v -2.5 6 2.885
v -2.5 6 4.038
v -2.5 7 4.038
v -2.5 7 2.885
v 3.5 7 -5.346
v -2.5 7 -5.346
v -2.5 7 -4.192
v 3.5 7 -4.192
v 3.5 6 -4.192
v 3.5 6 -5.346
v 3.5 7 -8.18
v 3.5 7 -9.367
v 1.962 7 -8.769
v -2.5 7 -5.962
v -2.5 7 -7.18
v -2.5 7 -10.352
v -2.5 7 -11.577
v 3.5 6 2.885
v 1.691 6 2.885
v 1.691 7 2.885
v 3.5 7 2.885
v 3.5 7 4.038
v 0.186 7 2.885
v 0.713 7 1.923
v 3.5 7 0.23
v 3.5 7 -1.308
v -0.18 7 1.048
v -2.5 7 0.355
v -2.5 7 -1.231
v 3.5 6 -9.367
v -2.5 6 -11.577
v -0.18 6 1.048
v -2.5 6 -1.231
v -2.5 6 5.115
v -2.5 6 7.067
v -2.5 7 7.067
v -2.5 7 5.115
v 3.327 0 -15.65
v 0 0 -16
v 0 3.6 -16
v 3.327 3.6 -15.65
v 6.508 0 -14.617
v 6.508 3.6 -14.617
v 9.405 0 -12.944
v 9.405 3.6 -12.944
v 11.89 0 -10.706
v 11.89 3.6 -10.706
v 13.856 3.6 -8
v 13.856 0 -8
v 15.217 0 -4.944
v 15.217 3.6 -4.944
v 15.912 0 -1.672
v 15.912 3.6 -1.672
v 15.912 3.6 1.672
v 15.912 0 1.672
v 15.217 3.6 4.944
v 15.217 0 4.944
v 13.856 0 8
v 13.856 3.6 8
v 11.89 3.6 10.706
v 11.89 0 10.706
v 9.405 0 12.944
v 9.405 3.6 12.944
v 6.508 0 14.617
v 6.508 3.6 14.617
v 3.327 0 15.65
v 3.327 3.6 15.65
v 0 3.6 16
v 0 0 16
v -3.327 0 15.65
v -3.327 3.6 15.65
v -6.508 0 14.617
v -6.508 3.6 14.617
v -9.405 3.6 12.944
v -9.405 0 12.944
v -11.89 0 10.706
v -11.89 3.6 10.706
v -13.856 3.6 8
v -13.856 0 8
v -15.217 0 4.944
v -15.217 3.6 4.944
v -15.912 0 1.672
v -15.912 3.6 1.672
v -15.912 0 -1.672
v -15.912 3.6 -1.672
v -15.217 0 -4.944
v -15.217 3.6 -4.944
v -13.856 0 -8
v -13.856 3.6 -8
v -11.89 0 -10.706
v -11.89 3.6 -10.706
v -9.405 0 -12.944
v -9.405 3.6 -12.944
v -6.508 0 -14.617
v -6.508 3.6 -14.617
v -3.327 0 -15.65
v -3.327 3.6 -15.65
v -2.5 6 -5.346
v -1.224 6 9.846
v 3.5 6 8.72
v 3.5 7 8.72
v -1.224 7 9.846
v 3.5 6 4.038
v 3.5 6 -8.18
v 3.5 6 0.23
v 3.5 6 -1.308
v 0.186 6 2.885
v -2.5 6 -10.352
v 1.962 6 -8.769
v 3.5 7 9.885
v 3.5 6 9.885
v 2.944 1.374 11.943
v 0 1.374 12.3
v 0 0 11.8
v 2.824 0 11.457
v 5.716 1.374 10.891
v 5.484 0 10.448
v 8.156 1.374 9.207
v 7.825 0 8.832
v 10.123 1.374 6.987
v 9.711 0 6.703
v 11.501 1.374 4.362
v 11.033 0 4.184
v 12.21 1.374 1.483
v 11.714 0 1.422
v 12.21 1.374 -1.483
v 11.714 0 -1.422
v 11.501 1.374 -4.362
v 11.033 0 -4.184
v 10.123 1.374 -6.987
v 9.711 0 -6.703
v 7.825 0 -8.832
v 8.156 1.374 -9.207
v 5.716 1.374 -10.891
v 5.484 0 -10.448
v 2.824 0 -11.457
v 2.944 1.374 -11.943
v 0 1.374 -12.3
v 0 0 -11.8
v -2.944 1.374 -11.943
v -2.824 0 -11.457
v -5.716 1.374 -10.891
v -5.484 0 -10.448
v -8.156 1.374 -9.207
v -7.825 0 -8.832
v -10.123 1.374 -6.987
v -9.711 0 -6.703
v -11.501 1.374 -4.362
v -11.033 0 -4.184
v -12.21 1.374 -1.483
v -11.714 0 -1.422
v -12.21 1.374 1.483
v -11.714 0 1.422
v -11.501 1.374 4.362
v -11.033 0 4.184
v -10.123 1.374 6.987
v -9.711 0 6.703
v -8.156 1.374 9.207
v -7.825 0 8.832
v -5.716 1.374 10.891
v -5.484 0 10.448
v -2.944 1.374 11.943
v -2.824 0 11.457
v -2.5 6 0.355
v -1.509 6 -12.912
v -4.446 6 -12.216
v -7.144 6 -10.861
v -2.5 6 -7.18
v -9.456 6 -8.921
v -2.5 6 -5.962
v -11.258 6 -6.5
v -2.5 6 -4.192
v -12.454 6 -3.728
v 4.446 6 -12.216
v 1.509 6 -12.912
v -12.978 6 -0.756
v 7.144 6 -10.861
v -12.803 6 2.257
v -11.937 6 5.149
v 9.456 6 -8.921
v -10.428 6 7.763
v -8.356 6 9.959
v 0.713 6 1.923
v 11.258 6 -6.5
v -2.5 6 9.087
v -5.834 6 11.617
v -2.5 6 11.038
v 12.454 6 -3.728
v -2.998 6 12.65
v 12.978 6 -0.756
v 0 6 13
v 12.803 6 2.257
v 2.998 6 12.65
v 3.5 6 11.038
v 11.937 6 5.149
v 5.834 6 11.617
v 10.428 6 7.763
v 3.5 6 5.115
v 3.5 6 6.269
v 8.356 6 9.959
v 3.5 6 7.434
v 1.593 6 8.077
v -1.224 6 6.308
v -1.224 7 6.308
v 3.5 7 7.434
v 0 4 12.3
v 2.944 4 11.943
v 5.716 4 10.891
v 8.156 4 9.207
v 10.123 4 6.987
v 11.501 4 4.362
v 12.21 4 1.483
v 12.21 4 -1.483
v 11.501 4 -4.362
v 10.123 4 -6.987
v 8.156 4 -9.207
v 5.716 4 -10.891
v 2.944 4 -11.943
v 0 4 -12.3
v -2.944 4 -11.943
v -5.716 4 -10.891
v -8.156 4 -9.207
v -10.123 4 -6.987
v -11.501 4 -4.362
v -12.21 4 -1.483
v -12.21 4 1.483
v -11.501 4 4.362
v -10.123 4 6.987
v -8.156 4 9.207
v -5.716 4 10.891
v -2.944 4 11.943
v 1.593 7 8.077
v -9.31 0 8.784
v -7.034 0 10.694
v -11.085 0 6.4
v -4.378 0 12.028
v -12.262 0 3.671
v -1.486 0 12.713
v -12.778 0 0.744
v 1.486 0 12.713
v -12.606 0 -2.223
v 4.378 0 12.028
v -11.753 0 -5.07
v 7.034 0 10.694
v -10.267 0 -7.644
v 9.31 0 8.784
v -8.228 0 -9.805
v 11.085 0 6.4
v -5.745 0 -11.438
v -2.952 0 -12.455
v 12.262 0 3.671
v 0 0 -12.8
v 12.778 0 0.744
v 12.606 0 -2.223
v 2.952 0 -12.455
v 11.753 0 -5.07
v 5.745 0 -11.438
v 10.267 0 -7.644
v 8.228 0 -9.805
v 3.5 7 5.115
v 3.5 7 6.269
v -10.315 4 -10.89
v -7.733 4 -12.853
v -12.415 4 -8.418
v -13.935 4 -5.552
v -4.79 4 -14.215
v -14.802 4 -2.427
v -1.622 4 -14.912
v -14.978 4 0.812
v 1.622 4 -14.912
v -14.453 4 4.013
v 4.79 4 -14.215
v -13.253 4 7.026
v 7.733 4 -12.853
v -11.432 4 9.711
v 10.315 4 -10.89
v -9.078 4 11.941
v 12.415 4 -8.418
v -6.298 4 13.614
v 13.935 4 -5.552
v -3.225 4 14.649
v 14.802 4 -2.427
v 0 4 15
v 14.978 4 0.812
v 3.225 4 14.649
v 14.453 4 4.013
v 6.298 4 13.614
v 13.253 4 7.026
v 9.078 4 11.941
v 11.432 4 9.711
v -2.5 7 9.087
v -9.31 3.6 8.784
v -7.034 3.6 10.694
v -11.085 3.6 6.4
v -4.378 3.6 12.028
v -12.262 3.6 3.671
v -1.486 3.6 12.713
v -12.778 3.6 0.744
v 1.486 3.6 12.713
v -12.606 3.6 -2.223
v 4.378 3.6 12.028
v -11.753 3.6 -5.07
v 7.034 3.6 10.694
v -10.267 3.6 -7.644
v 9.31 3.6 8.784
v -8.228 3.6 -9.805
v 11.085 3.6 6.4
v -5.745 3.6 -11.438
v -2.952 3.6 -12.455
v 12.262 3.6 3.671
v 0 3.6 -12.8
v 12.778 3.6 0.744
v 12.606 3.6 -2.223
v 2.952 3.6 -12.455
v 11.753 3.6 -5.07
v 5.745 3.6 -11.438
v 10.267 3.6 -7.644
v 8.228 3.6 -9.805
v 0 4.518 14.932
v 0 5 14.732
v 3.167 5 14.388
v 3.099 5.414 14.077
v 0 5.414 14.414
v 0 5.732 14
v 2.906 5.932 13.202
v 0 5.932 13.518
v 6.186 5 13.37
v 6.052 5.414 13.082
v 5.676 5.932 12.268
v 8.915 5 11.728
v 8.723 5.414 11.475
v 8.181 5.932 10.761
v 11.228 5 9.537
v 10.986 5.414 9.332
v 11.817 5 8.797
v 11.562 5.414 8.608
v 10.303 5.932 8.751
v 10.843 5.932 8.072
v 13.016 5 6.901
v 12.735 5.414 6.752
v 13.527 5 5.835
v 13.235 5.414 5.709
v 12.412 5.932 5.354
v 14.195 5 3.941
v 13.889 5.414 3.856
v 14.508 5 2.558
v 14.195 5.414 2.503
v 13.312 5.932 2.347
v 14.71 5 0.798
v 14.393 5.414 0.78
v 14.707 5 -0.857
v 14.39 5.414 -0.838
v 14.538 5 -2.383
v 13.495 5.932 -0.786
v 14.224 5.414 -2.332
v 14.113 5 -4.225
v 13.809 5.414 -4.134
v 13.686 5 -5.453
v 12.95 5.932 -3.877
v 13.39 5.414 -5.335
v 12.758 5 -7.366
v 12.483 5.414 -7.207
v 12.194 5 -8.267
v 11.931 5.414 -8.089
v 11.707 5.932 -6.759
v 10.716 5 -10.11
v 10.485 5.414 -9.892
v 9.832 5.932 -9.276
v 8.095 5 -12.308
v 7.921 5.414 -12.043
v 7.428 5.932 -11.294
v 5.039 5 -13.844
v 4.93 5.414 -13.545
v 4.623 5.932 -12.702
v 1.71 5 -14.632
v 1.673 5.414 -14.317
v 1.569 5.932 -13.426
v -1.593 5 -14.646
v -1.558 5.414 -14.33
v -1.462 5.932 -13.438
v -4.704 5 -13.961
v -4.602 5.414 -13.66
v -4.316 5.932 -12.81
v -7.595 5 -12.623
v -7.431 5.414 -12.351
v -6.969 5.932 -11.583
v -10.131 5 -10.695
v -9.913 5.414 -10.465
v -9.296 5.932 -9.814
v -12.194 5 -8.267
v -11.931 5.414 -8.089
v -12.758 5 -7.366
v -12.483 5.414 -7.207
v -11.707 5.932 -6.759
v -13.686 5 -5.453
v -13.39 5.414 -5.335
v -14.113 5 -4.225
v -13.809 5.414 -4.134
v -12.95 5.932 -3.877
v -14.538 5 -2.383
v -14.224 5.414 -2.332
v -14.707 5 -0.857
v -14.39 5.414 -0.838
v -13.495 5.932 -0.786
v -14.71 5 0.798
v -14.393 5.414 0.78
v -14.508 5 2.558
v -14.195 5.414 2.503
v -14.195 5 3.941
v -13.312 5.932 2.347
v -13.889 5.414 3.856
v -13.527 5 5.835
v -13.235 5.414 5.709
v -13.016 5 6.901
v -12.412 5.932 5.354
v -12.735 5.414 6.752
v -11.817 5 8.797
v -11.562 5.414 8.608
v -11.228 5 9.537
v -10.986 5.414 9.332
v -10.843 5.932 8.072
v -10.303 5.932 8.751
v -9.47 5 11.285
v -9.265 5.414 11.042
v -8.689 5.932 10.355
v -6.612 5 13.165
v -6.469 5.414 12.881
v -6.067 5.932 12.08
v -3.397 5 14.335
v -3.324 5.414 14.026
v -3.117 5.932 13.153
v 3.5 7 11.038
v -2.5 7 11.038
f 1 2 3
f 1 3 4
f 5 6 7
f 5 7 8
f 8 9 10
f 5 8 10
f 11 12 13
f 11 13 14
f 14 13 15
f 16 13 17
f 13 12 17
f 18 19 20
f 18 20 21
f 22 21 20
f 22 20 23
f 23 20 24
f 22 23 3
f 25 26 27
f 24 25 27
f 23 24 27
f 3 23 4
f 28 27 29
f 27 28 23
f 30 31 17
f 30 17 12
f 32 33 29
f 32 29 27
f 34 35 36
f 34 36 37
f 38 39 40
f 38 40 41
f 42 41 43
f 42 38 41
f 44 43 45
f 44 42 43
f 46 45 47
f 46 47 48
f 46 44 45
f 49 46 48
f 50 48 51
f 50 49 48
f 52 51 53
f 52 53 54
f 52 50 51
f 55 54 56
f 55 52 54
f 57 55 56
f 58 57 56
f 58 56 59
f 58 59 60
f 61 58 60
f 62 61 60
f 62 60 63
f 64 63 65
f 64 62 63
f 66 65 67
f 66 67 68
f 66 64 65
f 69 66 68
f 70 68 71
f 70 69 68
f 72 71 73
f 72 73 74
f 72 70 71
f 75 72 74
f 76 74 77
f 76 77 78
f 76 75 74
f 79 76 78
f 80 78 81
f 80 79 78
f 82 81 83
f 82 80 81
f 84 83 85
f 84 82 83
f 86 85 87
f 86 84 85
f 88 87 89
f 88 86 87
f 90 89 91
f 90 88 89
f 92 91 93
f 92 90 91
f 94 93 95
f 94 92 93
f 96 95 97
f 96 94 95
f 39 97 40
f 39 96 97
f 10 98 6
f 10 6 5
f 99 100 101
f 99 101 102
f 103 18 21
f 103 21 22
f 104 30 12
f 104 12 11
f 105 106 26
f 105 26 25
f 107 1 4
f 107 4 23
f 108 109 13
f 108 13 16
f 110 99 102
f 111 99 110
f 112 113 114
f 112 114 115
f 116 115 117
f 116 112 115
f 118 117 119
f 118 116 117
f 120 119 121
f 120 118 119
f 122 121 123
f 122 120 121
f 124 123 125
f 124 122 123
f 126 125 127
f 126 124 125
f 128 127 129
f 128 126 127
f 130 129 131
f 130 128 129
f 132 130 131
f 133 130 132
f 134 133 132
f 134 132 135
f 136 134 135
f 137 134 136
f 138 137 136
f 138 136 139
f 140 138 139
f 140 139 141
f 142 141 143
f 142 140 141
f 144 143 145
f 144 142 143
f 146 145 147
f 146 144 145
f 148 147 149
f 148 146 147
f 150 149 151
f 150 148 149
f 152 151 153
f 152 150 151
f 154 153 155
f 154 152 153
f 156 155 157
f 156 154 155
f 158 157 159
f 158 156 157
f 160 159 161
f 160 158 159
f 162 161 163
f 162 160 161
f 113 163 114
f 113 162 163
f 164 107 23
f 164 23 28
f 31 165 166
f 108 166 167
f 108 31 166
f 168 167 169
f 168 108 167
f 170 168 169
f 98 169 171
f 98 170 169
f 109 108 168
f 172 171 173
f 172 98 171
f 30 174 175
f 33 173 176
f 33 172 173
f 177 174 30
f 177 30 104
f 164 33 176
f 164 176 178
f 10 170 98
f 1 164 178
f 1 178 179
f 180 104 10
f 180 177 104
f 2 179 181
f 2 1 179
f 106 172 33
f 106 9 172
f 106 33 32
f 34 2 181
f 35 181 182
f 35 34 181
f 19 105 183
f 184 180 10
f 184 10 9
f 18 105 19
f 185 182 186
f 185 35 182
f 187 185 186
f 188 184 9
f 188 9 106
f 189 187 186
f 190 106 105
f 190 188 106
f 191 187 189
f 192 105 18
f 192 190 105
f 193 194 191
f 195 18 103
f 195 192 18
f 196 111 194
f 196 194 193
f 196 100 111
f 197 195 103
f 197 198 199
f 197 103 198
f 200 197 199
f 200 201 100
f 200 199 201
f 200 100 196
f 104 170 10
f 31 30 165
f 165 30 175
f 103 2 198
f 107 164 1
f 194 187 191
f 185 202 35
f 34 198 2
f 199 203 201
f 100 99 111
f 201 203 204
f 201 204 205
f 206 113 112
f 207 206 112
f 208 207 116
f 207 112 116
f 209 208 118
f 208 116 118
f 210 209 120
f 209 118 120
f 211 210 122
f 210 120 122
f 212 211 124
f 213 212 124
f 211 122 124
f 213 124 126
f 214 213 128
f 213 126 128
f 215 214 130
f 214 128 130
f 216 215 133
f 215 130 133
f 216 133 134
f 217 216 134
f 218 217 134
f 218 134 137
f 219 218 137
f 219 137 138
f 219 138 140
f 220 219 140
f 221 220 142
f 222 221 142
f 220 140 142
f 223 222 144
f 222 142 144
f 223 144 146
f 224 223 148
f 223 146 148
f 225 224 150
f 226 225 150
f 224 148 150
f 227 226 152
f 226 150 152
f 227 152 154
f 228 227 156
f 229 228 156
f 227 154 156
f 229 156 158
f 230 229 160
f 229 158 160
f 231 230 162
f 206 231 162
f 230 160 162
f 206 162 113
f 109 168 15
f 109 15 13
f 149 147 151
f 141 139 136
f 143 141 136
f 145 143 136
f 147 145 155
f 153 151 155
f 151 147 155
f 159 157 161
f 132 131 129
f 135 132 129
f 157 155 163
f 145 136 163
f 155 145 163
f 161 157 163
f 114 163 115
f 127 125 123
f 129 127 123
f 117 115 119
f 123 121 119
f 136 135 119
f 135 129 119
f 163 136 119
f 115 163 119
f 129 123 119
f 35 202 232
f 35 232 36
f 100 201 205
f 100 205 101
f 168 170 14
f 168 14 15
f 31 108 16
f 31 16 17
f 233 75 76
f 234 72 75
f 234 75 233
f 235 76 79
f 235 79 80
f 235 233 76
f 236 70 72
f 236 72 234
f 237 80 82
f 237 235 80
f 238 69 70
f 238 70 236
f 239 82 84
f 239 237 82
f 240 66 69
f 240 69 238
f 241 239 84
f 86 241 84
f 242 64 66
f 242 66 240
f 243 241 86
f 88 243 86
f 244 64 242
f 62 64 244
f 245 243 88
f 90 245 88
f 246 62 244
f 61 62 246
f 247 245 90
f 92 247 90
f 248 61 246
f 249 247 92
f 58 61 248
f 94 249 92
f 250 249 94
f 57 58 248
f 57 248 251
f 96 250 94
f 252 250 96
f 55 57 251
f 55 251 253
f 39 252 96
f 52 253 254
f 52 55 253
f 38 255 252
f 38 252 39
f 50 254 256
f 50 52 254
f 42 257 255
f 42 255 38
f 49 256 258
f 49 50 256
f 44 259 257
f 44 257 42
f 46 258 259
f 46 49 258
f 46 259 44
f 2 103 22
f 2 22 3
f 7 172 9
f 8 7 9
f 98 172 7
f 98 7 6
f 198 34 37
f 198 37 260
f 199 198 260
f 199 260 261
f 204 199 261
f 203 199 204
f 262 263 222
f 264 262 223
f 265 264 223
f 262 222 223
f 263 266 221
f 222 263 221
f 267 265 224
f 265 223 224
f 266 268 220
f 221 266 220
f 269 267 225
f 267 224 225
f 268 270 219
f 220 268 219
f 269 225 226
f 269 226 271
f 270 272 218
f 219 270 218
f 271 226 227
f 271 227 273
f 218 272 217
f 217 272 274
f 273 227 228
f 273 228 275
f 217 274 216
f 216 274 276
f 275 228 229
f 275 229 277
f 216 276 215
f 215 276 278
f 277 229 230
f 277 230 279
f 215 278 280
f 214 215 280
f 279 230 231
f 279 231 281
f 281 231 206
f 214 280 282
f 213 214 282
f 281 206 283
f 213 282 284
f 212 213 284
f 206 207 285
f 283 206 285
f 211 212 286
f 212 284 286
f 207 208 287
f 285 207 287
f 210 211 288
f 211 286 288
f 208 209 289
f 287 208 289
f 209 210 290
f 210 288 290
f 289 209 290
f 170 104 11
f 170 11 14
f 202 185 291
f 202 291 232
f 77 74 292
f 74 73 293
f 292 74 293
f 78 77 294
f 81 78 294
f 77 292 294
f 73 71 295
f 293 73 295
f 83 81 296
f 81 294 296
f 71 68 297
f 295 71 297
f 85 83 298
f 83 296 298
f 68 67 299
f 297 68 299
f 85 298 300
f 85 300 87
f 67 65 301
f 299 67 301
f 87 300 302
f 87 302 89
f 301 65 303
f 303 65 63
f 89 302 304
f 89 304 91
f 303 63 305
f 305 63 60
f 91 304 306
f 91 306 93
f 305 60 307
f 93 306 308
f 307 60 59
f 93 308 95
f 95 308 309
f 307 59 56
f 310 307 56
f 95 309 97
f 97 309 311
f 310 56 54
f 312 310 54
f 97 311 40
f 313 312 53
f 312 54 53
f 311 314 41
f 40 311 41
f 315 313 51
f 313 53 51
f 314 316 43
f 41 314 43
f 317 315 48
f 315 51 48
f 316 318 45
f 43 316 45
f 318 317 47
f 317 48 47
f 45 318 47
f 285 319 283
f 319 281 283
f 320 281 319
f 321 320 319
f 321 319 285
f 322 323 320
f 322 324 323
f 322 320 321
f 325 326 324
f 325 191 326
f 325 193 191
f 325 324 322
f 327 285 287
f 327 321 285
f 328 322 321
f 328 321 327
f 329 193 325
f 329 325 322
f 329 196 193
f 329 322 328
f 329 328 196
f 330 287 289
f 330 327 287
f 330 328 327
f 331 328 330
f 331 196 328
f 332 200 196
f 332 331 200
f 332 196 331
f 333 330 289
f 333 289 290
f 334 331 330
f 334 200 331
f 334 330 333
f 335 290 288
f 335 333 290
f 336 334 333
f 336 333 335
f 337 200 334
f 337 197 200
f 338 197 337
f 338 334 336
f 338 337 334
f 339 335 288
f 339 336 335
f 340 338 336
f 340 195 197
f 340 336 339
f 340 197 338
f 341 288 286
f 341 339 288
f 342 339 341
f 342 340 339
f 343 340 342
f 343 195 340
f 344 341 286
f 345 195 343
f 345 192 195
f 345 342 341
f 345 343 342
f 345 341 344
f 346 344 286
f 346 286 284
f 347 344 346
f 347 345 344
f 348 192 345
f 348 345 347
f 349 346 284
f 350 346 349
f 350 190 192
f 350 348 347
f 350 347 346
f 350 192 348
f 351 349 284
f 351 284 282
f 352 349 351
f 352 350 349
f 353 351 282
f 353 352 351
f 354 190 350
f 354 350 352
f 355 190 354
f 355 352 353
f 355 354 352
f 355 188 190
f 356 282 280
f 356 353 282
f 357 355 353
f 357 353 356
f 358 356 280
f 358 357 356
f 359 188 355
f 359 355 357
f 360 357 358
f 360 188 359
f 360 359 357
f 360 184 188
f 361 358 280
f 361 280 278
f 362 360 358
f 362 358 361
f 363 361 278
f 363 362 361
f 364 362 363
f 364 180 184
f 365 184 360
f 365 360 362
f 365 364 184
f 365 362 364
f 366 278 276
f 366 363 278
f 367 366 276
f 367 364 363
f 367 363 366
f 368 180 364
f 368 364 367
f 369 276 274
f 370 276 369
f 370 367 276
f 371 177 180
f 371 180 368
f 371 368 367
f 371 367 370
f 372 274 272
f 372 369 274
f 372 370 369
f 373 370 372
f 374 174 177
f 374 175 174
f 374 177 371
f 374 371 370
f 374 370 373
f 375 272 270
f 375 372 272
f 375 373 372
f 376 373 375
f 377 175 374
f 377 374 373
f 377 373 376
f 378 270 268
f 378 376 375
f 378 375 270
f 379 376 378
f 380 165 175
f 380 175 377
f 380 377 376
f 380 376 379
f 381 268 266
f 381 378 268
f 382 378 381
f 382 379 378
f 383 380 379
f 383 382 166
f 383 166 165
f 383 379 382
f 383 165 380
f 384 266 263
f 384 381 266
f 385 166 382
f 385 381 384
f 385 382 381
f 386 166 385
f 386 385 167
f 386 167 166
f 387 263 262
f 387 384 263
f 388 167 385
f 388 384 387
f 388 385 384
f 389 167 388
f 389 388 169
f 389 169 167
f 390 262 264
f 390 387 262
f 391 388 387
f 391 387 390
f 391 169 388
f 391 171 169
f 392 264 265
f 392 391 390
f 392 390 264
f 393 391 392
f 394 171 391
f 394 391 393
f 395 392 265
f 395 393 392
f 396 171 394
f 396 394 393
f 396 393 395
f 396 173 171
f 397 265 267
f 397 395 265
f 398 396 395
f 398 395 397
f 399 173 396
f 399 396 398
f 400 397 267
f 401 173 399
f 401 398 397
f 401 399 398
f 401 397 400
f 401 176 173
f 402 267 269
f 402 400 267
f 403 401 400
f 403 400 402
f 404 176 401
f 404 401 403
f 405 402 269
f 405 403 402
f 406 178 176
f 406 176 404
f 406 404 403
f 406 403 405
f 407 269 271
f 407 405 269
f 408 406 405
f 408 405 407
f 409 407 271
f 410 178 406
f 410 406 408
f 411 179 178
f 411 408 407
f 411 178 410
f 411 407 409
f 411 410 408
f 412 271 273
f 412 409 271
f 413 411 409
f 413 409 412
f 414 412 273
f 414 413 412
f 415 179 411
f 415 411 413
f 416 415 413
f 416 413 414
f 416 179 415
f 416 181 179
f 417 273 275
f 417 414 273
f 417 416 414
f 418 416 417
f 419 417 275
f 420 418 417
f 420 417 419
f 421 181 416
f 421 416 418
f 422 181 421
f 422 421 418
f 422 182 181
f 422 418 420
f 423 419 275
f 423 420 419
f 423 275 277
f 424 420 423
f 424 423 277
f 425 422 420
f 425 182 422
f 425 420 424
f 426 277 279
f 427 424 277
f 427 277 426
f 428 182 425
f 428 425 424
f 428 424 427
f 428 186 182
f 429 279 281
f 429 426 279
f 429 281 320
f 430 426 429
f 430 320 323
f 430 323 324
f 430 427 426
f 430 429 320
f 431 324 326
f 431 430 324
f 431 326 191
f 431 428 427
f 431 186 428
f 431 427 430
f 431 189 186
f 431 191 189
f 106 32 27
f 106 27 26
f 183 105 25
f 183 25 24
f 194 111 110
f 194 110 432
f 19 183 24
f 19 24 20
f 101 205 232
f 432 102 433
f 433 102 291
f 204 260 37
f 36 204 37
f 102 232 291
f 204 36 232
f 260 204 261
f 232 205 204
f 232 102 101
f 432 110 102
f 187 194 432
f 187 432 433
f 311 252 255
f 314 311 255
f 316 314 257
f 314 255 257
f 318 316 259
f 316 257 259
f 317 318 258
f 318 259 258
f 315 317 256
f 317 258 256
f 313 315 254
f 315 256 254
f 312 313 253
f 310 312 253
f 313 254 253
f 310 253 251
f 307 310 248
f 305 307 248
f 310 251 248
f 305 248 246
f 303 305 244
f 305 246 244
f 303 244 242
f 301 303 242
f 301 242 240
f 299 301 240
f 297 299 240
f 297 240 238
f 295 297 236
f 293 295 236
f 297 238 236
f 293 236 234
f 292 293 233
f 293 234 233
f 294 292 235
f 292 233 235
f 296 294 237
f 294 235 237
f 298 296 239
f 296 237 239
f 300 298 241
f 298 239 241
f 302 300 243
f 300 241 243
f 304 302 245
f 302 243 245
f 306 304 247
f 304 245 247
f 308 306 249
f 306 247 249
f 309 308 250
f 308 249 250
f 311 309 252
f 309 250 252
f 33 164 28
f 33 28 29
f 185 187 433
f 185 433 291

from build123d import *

# Parameters (mm, degrees)
SKETCH1_R           = 12.3
BOSS_EXTRUDE1_DEPTH = 4
SKETCH2_R           = 15
BOSS_EXTRUDE2_DEPTH = 2
CHAMFER1_SIZE       = 0.5
CHAMFER1_SIZE2      = 1.37373871
SKETCH3_W           = 6
SKETCH3_H           = 1.153846154
BOSS_EXTRUDE3_DEPTH = 1
SKETCH4_R           = 16
SKETCH4_R_2         = 12.8
BOSS_EXTRUDE4_DEPTH = 3.6
FILLET1_R           = 2


with BuildPart() as part:
    # Sketch1 → Boss-Extrude1 (new body)
    with BuildSketch(Plane(origin=(0, 0, 0), x_dir=(1, 0, 0), z_dir=(0, 1, 0))):
        with Locations(Location((0, 0, 0), (0, 0, 270))):
            Circle(SKETCH1_R)
    extrude(amount=BOSS_EXTRUDE1_DEPTH)

    # Sketch2 → Boss-Extrude2 (add)
    with BuildSketch(Plane(origin=(0, 4, 0), x_dir=(1, 0, 0), z_dir=(0, 1, 0))):
        with Locations(Location((0, 0, 0), (0, 0, 270))):
            Circle(SKETCH2_R)
    extrude(amount=BOSS_EXTRUDE2_DEPTH)

    # Chamfer1
    chamfer1_edges = [part.edges().sort_by_distance(p)[0] for p in [
        (0, 0, -12.3),
    ]]
    chamfer1_side = [part.faces().sort_by_distance(p)[0] for p in [
        (0, 0, 0),
    ]]
    chamfer(chamfer1_edges, length=CHAMFER1_SIZE, length2=CHAMFER1_SIZE2, reference=chamfer1_side[0])

    # Sketch3 → Boss-Extrude3 (add)
    with BuildSketch(Plane(origin=(0, 6, 0), x_dir=(1, 0, 0), z_dir=(0, 1, 0))):
        Polygon((3.5, -11.038461538), (-2.5, -11.038461538), (-2.5, -9.086538462), (1.592548077, -8.076923077), (-2.5, -7.067307692), (-2.5, -5.115384615), (3.5, -5.115384615), (3.5, -6.269230769), (-1.223557692, -6.307692308), (3.5, -7.433894231), (3.5, -8.719951923), (-1.223557692, -9.846153846), (3.5, -9.884615385), align=None)
        Polygon((3.5, -4.038461538), (-2.5, -4.038461538), (-2.5, -2.884615385), (0.186298077, -2.884615385), (-2.5, -0.354567308), (-2.5, 1.230769231), (-0.180288462, -1.048076923), (3.5, 1.307692308), (3.5, -0.229567308), (0.712740385, -1.923076923), (1.691105769, -2.884615385), (3.5, -2.884615385), align=None)
        with Locations((0.5, 4.769230769)):
            Rectangle(SKETCH3_W, SKETCH3_H)
        Polygon((3.5, 8.180288462), (-2.5, 5.961538462), (-2.5, 7.180288462), (1.961538462, 8.769230769), (-2.5, 10.352163462), (-2.5, 11.576923077), (3.5, 9.366586538), align=None)
    extrude(amount=BOSS_EXTRUDE3_DEPTH)

    # Fillet1
    fillet1_edges = [part.edges().sort_by_distance(p)[0] for p in [
        (0, 6, -15),
    ]]
    fillet(fillet1_edges, radius=FILLET1_R - 0.0001)  # a hair under: the kernel refuses the full size


with BuildPart() as body_2:
    # Sketch4 → Boss-Extrude4 (new body)
    with BuildSketch(Plane.XZ):
        with Locations(Location((0, 0, 0), (0, 0, 270))):
            Circle(SKETCH4_R)
        with Locations(Location((0, 0, 0), (0, 0, 270))):
            Circle(SKETCH4_R_2, mode=Mode.SUBTRACT)
    extrude(amount=-BOSS_EXTRUDE4_DEPTH)


solid = Compound([part.part, body_2.part])
